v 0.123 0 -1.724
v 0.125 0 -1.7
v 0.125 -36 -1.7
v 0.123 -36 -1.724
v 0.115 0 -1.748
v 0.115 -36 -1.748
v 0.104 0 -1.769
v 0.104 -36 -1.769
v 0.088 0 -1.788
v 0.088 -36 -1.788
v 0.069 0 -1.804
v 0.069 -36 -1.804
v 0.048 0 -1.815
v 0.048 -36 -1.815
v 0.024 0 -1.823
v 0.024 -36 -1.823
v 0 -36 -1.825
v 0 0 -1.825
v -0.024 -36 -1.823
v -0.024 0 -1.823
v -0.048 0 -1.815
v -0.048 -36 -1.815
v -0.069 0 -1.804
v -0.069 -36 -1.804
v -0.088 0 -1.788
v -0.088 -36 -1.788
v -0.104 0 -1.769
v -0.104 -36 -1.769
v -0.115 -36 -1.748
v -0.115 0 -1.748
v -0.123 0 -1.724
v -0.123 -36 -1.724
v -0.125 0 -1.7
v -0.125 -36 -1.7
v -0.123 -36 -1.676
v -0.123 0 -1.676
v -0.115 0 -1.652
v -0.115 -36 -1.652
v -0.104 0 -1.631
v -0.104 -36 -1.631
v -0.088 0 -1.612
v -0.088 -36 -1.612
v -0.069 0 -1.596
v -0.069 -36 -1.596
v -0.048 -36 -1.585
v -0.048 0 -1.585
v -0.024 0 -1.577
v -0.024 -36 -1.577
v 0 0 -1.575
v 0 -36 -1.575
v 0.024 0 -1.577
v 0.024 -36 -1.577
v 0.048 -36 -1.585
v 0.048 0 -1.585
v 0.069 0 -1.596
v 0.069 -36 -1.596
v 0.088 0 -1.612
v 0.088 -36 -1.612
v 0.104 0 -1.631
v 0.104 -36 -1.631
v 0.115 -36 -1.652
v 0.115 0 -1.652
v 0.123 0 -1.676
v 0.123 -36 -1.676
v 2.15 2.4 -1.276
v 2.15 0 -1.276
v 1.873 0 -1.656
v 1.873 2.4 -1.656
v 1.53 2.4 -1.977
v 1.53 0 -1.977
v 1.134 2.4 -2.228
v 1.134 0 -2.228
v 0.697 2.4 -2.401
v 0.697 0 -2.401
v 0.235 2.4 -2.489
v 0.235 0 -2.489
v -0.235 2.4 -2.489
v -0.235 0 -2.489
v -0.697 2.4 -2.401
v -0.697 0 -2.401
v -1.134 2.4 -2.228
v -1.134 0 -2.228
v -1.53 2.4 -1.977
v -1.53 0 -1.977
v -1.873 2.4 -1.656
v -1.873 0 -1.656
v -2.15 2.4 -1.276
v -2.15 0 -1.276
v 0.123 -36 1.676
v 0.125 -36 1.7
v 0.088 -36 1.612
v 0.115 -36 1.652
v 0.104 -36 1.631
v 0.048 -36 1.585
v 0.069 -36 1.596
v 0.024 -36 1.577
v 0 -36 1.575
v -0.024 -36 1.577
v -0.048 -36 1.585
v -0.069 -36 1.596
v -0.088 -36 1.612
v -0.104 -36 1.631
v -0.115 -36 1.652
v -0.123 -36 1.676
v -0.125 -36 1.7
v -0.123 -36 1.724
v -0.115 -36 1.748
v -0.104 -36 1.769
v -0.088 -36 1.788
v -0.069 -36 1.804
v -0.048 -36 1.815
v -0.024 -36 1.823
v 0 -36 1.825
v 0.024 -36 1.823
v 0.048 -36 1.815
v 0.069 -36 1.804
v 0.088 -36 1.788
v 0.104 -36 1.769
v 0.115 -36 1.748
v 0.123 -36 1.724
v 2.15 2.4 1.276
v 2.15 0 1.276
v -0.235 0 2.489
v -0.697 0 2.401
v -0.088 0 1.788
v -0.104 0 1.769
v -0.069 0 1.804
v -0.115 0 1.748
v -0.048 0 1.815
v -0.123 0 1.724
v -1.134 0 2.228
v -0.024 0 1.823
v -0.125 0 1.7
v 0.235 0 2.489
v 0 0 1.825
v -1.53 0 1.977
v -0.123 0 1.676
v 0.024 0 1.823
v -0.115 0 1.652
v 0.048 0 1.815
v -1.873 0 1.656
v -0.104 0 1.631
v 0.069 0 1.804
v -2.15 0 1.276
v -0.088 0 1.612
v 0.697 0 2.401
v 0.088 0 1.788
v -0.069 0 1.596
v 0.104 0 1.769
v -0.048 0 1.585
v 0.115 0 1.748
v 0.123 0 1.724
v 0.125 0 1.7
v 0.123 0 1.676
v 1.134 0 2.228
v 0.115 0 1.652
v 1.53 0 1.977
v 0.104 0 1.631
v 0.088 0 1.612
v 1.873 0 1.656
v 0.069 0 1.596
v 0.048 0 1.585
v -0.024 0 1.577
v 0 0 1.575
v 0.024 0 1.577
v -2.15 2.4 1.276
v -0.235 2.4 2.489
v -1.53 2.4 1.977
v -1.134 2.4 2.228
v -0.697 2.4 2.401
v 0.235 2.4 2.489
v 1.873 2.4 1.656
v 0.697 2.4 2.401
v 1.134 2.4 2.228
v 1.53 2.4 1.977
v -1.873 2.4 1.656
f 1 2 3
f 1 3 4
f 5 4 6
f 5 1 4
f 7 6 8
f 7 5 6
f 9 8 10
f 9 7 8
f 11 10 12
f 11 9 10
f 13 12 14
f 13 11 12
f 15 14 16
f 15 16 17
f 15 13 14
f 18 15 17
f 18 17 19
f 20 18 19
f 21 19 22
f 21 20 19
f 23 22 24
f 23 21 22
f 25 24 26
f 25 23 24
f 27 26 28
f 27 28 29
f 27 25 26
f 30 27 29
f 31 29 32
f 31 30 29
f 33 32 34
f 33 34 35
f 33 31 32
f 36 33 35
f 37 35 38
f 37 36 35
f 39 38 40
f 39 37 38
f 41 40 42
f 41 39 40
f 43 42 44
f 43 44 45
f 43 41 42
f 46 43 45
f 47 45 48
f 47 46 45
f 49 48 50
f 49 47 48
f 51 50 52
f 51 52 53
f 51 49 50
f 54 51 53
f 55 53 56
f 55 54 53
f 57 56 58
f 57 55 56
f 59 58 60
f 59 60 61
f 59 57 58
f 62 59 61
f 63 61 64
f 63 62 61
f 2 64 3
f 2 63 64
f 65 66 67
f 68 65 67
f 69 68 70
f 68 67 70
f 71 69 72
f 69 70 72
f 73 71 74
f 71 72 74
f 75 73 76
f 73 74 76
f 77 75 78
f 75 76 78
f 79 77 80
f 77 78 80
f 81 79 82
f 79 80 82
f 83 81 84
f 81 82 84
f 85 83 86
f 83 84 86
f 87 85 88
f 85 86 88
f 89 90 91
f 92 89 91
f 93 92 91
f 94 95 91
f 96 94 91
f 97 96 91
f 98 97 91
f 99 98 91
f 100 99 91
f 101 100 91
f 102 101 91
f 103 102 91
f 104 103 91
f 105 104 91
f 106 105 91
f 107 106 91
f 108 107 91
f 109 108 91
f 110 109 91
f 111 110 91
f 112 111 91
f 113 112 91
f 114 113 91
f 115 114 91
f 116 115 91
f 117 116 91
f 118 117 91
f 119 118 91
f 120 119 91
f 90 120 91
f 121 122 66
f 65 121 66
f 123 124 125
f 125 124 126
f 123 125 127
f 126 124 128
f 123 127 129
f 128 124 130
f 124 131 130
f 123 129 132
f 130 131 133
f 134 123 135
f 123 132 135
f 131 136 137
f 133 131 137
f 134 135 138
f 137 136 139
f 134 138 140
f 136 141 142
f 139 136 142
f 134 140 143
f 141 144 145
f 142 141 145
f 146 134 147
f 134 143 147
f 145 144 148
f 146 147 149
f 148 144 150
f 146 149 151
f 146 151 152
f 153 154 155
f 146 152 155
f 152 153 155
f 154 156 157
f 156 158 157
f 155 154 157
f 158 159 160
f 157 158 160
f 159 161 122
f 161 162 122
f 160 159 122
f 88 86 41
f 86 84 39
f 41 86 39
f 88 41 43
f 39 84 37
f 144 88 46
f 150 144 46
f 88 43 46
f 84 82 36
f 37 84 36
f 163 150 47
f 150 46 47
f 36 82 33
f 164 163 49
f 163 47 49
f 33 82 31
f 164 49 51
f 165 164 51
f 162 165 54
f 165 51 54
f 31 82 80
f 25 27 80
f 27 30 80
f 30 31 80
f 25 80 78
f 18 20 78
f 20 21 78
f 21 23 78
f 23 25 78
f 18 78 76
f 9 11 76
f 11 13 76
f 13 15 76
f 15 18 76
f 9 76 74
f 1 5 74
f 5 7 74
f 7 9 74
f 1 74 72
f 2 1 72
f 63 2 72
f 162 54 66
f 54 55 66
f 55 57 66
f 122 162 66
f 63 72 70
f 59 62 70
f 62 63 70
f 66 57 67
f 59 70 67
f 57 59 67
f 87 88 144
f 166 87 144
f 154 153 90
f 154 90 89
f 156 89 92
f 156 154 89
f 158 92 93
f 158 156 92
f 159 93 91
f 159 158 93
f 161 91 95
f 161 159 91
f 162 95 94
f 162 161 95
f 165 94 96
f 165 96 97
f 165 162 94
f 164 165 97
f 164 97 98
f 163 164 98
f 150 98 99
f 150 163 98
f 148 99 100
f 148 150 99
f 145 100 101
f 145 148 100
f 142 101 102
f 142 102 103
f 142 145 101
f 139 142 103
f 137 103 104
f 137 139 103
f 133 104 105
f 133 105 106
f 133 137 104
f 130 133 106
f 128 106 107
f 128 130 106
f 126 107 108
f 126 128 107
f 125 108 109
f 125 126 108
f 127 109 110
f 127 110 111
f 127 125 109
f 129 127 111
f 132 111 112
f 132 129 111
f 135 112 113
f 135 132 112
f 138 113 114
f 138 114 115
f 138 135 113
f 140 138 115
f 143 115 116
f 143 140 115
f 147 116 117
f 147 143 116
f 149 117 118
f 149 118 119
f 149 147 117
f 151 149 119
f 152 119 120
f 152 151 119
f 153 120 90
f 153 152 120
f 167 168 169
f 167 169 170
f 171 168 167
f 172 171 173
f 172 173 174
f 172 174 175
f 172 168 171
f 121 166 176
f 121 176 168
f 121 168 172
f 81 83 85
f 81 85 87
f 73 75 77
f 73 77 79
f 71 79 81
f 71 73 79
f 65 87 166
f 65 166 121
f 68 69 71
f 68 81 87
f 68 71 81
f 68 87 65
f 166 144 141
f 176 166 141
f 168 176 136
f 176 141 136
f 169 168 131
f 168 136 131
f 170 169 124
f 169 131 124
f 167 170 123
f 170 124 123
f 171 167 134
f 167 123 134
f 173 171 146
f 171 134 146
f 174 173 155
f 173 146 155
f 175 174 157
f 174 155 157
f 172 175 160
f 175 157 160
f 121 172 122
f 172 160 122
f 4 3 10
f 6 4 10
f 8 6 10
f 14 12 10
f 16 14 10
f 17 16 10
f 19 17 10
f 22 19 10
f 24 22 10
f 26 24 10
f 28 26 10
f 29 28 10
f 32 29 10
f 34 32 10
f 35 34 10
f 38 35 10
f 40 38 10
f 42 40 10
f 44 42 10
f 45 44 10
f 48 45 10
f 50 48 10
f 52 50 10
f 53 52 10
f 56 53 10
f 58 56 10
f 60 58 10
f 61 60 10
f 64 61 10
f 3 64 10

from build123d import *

# Parameters (mm, degrees)
BOSS_EXTRUDE1_DEPTH = 2.4
SKETCH2_R           = 0.125
BOSS_EXTRUDE2_DEPTH = 36


with BuildPart() as part:
    # Sketch1 → Boss-Extrude1 (new body)
    with BuildSketch(Plane(origin=(0, 0, 0), x_dir=(1, 0, 0), z_dir=(0, 1, 0))):
        with BuildLine():
            Line((-2.15, 1.275735082), (-2.15, -1.275735082))
            ThreePointArc((-2.15, -1.275735082), (0, -2.5), (2.15, -1.275735082))
            Line((2.15, -1.275735082), (2.15, 1.275735082))
            ThreePointArc((2.15, 1.275735082), (0, 2.5), (-2.15, 1.275735082))
        make_face()
    extrude(amount=BOSS_EXTRUDE1_DEPTH)

    # Sketch2 → Boss-Extrude2 (add)
    with BuildSketch(Plane(origin=(0, 0, 0), x_dir=(1, 0, 0), z_dir=(0, 1, 0))):
        with Locations((0, 1.7)):
            Circle(SKETCH2_R)
        with Locations((0, -1.7)):
            Circle(SKETCH2_R)
    extrude(amount=-BOSS_EXTRUDE2_DEPTH)


solid = part.part
